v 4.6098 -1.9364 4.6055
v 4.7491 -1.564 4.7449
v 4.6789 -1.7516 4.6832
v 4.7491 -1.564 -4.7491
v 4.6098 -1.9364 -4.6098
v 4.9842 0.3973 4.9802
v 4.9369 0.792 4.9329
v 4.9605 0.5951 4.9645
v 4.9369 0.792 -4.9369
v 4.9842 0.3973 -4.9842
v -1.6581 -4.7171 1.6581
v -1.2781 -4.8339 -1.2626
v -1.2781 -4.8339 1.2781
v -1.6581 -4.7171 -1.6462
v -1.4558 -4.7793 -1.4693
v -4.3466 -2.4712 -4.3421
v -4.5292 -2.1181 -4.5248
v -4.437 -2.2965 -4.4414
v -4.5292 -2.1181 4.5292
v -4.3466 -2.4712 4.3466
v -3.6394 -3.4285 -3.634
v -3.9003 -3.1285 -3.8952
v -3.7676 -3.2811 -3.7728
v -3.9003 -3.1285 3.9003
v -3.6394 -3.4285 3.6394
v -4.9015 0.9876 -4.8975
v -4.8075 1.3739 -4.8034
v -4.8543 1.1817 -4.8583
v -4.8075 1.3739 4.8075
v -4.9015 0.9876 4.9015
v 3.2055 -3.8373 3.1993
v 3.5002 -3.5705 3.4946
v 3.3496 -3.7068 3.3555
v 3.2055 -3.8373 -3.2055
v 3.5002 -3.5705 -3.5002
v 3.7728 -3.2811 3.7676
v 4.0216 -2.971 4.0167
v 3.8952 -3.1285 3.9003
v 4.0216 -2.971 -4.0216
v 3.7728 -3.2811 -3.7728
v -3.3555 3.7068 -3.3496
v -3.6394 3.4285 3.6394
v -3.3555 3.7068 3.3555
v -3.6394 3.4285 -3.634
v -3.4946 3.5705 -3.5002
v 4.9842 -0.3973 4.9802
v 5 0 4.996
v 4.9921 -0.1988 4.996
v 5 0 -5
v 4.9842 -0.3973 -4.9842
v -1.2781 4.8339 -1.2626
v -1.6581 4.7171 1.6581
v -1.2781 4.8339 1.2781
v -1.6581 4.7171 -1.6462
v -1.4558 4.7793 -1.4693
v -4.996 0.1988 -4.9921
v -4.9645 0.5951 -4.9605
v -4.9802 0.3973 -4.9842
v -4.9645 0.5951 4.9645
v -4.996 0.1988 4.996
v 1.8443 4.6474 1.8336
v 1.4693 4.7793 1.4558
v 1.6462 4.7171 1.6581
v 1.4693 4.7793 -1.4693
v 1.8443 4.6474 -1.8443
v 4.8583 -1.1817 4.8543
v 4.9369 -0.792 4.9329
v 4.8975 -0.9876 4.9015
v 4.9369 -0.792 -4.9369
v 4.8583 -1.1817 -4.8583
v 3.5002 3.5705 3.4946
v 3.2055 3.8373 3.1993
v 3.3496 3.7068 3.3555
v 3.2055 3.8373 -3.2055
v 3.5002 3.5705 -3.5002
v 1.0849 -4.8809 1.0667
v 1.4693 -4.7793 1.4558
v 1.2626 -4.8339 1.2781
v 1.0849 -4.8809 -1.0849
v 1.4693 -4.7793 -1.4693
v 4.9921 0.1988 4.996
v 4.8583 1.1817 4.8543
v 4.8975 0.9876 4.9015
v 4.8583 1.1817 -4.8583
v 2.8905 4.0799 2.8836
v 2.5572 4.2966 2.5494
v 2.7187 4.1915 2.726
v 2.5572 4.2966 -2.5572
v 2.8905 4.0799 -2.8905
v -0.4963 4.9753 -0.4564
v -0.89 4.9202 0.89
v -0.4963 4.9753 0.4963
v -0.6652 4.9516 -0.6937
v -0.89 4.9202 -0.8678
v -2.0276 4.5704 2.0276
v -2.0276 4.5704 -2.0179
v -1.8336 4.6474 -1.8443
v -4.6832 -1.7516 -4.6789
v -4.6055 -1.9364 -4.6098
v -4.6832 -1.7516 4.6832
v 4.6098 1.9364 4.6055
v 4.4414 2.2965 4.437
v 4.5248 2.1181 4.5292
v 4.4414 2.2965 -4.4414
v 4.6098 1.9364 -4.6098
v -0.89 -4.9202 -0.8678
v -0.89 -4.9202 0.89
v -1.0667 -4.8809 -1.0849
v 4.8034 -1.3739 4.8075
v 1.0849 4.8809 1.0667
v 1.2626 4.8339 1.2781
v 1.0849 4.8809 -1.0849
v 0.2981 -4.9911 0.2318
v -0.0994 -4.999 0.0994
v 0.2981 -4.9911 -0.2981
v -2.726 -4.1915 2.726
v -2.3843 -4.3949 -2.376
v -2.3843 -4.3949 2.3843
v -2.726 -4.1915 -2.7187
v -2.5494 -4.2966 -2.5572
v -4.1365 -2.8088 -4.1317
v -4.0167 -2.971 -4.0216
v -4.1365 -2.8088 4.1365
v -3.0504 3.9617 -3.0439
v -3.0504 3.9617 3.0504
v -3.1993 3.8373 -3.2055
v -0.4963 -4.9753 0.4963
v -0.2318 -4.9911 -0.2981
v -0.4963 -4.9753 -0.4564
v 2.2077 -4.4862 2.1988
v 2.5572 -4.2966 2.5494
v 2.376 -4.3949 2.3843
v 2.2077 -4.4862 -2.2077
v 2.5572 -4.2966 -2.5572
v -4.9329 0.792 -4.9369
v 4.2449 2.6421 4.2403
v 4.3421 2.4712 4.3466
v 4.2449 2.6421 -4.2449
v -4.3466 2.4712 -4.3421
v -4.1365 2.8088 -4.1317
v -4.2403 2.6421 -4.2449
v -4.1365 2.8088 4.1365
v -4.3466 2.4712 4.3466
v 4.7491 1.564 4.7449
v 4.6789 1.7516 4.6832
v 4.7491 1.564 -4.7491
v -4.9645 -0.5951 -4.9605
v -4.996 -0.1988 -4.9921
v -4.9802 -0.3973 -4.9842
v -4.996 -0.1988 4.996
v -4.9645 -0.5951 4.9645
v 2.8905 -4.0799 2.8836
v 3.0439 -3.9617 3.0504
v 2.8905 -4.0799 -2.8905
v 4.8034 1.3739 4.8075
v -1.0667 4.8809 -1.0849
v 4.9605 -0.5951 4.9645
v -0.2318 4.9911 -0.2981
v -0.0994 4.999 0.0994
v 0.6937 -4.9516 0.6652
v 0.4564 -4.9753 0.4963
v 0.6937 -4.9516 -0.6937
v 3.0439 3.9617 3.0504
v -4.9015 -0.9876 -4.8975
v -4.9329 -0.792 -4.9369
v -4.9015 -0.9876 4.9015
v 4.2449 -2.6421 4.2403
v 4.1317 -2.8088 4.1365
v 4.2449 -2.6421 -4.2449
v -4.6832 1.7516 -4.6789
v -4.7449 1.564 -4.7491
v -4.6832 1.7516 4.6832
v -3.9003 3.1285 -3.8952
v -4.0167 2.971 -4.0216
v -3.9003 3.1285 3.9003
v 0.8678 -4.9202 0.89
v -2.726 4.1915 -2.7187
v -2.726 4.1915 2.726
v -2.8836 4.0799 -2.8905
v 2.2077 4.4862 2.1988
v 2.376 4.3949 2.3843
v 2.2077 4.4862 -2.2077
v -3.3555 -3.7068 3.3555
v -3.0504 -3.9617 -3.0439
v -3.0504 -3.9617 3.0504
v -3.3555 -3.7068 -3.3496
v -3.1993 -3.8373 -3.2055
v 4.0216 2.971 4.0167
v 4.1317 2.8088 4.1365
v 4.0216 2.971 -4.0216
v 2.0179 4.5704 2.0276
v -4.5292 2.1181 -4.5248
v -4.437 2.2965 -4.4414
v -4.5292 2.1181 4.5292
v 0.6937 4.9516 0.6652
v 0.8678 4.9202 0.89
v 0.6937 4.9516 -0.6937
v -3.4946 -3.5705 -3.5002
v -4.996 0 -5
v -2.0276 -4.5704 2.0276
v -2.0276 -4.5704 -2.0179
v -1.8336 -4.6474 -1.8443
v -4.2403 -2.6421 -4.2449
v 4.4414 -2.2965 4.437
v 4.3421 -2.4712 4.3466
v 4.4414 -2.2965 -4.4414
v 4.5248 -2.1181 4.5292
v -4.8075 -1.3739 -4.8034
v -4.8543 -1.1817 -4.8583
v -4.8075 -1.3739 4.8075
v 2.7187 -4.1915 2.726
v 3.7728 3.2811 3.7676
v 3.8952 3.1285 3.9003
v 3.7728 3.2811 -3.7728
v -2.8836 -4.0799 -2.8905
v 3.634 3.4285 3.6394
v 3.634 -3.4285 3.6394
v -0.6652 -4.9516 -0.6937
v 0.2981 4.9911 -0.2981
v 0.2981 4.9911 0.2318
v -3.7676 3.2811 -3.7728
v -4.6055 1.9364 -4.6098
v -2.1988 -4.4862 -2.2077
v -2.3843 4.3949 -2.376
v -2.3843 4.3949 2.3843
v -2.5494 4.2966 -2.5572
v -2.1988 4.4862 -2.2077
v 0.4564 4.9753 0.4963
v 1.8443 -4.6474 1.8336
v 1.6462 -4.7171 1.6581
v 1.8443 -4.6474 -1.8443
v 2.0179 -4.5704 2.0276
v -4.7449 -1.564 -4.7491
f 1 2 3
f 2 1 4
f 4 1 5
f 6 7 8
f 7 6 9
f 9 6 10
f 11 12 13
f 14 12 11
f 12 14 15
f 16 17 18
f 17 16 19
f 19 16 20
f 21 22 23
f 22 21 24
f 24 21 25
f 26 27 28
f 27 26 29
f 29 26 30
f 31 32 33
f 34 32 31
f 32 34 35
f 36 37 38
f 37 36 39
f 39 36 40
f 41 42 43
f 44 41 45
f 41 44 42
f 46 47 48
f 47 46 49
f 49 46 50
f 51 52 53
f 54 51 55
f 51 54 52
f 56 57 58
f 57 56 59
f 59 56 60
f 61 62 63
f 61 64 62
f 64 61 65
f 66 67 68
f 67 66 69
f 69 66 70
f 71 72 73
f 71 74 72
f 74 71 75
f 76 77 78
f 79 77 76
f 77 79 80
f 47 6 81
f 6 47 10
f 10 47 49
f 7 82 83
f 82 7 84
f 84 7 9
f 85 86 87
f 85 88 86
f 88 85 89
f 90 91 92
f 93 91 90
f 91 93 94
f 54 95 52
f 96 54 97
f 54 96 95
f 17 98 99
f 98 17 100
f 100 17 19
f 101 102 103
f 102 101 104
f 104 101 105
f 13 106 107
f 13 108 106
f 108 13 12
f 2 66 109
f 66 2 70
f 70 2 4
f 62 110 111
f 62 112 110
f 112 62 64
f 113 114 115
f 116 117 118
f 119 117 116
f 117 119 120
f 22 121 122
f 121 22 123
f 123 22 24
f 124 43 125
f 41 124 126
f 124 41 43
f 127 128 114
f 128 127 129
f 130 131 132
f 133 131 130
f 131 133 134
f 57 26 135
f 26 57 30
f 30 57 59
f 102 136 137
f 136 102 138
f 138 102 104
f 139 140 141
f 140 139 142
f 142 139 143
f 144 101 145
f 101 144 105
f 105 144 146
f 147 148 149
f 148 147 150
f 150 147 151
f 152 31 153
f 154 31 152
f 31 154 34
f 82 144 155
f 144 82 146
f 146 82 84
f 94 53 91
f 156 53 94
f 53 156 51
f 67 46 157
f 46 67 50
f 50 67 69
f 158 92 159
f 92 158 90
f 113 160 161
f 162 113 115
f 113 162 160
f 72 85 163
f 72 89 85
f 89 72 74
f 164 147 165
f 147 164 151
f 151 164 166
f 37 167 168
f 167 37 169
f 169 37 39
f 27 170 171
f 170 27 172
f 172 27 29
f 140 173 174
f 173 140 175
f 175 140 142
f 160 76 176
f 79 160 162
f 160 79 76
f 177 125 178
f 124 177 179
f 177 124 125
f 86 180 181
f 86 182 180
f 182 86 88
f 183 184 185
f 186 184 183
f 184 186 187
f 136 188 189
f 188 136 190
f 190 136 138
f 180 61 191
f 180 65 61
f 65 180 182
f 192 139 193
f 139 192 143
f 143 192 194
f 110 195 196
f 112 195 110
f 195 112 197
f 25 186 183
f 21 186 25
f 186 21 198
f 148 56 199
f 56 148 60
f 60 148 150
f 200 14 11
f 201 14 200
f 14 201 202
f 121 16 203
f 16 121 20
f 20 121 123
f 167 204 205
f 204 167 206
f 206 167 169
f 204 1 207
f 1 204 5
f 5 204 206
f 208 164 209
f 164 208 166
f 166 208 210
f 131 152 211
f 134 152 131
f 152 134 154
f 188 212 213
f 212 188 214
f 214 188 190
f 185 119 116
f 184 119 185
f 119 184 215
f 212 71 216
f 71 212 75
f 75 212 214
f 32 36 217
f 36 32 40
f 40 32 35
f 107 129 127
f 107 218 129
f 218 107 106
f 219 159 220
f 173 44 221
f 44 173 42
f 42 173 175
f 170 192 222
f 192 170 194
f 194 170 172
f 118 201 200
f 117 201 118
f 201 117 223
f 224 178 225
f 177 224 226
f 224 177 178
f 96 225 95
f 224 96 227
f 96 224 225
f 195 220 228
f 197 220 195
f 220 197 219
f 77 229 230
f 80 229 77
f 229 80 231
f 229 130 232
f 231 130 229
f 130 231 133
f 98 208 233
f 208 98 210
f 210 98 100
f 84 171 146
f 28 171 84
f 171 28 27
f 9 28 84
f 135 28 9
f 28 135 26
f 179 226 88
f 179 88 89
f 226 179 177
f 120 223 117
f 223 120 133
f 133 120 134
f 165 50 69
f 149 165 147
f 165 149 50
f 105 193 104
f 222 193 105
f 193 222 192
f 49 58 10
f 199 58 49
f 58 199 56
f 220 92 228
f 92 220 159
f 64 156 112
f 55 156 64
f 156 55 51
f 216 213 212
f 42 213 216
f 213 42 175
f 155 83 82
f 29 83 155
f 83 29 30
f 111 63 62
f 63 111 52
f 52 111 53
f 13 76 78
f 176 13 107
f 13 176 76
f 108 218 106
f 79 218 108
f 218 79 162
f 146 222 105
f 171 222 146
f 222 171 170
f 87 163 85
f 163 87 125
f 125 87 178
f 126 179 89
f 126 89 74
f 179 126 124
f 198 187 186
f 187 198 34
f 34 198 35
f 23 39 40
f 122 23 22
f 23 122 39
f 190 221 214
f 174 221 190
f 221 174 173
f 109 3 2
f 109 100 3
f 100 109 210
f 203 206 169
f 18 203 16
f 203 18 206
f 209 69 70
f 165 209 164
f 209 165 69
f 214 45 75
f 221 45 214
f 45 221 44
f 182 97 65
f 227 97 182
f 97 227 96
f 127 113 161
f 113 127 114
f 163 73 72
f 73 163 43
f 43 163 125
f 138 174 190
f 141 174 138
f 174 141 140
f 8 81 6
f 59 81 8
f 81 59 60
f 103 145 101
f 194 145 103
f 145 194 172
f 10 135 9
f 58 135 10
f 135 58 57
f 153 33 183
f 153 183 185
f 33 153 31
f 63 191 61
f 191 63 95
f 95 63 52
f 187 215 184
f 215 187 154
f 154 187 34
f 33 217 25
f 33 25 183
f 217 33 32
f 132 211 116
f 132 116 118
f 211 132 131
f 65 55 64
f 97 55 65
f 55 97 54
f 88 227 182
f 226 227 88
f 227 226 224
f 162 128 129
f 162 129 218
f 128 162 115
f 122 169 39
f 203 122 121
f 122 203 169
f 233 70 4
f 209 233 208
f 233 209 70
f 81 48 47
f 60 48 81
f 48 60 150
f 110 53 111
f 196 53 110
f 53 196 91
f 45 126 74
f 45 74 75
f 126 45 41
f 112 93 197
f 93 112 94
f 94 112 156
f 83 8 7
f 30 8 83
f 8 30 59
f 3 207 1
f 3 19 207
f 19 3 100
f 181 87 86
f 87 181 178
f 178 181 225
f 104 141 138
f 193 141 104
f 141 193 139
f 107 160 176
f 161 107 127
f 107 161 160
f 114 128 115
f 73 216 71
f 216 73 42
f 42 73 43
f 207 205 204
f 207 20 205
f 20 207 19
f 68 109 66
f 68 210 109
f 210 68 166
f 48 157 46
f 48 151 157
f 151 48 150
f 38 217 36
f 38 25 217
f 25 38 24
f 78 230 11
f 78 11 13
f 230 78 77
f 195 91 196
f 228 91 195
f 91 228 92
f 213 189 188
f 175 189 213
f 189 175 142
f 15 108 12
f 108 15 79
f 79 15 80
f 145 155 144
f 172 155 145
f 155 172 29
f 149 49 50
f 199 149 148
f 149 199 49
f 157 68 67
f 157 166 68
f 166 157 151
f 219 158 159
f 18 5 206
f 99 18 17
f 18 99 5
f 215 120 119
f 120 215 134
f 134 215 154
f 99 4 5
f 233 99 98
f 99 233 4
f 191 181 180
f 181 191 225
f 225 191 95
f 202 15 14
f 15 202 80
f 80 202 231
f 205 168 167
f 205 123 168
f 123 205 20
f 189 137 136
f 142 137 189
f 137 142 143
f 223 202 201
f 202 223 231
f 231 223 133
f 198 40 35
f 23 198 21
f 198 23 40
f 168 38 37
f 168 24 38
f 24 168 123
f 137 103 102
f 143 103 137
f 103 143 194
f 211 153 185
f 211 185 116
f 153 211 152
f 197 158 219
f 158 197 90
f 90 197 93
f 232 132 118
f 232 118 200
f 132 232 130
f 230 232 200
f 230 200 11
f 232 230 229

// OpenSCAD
$fa = 1;
$fs = 0.4;

intersection() {
    cylinder(h = 30, r = 5, center=true);

    rotate([0, 90, 0])
    cylinder(h = 30, r = 5, center=true);
}
